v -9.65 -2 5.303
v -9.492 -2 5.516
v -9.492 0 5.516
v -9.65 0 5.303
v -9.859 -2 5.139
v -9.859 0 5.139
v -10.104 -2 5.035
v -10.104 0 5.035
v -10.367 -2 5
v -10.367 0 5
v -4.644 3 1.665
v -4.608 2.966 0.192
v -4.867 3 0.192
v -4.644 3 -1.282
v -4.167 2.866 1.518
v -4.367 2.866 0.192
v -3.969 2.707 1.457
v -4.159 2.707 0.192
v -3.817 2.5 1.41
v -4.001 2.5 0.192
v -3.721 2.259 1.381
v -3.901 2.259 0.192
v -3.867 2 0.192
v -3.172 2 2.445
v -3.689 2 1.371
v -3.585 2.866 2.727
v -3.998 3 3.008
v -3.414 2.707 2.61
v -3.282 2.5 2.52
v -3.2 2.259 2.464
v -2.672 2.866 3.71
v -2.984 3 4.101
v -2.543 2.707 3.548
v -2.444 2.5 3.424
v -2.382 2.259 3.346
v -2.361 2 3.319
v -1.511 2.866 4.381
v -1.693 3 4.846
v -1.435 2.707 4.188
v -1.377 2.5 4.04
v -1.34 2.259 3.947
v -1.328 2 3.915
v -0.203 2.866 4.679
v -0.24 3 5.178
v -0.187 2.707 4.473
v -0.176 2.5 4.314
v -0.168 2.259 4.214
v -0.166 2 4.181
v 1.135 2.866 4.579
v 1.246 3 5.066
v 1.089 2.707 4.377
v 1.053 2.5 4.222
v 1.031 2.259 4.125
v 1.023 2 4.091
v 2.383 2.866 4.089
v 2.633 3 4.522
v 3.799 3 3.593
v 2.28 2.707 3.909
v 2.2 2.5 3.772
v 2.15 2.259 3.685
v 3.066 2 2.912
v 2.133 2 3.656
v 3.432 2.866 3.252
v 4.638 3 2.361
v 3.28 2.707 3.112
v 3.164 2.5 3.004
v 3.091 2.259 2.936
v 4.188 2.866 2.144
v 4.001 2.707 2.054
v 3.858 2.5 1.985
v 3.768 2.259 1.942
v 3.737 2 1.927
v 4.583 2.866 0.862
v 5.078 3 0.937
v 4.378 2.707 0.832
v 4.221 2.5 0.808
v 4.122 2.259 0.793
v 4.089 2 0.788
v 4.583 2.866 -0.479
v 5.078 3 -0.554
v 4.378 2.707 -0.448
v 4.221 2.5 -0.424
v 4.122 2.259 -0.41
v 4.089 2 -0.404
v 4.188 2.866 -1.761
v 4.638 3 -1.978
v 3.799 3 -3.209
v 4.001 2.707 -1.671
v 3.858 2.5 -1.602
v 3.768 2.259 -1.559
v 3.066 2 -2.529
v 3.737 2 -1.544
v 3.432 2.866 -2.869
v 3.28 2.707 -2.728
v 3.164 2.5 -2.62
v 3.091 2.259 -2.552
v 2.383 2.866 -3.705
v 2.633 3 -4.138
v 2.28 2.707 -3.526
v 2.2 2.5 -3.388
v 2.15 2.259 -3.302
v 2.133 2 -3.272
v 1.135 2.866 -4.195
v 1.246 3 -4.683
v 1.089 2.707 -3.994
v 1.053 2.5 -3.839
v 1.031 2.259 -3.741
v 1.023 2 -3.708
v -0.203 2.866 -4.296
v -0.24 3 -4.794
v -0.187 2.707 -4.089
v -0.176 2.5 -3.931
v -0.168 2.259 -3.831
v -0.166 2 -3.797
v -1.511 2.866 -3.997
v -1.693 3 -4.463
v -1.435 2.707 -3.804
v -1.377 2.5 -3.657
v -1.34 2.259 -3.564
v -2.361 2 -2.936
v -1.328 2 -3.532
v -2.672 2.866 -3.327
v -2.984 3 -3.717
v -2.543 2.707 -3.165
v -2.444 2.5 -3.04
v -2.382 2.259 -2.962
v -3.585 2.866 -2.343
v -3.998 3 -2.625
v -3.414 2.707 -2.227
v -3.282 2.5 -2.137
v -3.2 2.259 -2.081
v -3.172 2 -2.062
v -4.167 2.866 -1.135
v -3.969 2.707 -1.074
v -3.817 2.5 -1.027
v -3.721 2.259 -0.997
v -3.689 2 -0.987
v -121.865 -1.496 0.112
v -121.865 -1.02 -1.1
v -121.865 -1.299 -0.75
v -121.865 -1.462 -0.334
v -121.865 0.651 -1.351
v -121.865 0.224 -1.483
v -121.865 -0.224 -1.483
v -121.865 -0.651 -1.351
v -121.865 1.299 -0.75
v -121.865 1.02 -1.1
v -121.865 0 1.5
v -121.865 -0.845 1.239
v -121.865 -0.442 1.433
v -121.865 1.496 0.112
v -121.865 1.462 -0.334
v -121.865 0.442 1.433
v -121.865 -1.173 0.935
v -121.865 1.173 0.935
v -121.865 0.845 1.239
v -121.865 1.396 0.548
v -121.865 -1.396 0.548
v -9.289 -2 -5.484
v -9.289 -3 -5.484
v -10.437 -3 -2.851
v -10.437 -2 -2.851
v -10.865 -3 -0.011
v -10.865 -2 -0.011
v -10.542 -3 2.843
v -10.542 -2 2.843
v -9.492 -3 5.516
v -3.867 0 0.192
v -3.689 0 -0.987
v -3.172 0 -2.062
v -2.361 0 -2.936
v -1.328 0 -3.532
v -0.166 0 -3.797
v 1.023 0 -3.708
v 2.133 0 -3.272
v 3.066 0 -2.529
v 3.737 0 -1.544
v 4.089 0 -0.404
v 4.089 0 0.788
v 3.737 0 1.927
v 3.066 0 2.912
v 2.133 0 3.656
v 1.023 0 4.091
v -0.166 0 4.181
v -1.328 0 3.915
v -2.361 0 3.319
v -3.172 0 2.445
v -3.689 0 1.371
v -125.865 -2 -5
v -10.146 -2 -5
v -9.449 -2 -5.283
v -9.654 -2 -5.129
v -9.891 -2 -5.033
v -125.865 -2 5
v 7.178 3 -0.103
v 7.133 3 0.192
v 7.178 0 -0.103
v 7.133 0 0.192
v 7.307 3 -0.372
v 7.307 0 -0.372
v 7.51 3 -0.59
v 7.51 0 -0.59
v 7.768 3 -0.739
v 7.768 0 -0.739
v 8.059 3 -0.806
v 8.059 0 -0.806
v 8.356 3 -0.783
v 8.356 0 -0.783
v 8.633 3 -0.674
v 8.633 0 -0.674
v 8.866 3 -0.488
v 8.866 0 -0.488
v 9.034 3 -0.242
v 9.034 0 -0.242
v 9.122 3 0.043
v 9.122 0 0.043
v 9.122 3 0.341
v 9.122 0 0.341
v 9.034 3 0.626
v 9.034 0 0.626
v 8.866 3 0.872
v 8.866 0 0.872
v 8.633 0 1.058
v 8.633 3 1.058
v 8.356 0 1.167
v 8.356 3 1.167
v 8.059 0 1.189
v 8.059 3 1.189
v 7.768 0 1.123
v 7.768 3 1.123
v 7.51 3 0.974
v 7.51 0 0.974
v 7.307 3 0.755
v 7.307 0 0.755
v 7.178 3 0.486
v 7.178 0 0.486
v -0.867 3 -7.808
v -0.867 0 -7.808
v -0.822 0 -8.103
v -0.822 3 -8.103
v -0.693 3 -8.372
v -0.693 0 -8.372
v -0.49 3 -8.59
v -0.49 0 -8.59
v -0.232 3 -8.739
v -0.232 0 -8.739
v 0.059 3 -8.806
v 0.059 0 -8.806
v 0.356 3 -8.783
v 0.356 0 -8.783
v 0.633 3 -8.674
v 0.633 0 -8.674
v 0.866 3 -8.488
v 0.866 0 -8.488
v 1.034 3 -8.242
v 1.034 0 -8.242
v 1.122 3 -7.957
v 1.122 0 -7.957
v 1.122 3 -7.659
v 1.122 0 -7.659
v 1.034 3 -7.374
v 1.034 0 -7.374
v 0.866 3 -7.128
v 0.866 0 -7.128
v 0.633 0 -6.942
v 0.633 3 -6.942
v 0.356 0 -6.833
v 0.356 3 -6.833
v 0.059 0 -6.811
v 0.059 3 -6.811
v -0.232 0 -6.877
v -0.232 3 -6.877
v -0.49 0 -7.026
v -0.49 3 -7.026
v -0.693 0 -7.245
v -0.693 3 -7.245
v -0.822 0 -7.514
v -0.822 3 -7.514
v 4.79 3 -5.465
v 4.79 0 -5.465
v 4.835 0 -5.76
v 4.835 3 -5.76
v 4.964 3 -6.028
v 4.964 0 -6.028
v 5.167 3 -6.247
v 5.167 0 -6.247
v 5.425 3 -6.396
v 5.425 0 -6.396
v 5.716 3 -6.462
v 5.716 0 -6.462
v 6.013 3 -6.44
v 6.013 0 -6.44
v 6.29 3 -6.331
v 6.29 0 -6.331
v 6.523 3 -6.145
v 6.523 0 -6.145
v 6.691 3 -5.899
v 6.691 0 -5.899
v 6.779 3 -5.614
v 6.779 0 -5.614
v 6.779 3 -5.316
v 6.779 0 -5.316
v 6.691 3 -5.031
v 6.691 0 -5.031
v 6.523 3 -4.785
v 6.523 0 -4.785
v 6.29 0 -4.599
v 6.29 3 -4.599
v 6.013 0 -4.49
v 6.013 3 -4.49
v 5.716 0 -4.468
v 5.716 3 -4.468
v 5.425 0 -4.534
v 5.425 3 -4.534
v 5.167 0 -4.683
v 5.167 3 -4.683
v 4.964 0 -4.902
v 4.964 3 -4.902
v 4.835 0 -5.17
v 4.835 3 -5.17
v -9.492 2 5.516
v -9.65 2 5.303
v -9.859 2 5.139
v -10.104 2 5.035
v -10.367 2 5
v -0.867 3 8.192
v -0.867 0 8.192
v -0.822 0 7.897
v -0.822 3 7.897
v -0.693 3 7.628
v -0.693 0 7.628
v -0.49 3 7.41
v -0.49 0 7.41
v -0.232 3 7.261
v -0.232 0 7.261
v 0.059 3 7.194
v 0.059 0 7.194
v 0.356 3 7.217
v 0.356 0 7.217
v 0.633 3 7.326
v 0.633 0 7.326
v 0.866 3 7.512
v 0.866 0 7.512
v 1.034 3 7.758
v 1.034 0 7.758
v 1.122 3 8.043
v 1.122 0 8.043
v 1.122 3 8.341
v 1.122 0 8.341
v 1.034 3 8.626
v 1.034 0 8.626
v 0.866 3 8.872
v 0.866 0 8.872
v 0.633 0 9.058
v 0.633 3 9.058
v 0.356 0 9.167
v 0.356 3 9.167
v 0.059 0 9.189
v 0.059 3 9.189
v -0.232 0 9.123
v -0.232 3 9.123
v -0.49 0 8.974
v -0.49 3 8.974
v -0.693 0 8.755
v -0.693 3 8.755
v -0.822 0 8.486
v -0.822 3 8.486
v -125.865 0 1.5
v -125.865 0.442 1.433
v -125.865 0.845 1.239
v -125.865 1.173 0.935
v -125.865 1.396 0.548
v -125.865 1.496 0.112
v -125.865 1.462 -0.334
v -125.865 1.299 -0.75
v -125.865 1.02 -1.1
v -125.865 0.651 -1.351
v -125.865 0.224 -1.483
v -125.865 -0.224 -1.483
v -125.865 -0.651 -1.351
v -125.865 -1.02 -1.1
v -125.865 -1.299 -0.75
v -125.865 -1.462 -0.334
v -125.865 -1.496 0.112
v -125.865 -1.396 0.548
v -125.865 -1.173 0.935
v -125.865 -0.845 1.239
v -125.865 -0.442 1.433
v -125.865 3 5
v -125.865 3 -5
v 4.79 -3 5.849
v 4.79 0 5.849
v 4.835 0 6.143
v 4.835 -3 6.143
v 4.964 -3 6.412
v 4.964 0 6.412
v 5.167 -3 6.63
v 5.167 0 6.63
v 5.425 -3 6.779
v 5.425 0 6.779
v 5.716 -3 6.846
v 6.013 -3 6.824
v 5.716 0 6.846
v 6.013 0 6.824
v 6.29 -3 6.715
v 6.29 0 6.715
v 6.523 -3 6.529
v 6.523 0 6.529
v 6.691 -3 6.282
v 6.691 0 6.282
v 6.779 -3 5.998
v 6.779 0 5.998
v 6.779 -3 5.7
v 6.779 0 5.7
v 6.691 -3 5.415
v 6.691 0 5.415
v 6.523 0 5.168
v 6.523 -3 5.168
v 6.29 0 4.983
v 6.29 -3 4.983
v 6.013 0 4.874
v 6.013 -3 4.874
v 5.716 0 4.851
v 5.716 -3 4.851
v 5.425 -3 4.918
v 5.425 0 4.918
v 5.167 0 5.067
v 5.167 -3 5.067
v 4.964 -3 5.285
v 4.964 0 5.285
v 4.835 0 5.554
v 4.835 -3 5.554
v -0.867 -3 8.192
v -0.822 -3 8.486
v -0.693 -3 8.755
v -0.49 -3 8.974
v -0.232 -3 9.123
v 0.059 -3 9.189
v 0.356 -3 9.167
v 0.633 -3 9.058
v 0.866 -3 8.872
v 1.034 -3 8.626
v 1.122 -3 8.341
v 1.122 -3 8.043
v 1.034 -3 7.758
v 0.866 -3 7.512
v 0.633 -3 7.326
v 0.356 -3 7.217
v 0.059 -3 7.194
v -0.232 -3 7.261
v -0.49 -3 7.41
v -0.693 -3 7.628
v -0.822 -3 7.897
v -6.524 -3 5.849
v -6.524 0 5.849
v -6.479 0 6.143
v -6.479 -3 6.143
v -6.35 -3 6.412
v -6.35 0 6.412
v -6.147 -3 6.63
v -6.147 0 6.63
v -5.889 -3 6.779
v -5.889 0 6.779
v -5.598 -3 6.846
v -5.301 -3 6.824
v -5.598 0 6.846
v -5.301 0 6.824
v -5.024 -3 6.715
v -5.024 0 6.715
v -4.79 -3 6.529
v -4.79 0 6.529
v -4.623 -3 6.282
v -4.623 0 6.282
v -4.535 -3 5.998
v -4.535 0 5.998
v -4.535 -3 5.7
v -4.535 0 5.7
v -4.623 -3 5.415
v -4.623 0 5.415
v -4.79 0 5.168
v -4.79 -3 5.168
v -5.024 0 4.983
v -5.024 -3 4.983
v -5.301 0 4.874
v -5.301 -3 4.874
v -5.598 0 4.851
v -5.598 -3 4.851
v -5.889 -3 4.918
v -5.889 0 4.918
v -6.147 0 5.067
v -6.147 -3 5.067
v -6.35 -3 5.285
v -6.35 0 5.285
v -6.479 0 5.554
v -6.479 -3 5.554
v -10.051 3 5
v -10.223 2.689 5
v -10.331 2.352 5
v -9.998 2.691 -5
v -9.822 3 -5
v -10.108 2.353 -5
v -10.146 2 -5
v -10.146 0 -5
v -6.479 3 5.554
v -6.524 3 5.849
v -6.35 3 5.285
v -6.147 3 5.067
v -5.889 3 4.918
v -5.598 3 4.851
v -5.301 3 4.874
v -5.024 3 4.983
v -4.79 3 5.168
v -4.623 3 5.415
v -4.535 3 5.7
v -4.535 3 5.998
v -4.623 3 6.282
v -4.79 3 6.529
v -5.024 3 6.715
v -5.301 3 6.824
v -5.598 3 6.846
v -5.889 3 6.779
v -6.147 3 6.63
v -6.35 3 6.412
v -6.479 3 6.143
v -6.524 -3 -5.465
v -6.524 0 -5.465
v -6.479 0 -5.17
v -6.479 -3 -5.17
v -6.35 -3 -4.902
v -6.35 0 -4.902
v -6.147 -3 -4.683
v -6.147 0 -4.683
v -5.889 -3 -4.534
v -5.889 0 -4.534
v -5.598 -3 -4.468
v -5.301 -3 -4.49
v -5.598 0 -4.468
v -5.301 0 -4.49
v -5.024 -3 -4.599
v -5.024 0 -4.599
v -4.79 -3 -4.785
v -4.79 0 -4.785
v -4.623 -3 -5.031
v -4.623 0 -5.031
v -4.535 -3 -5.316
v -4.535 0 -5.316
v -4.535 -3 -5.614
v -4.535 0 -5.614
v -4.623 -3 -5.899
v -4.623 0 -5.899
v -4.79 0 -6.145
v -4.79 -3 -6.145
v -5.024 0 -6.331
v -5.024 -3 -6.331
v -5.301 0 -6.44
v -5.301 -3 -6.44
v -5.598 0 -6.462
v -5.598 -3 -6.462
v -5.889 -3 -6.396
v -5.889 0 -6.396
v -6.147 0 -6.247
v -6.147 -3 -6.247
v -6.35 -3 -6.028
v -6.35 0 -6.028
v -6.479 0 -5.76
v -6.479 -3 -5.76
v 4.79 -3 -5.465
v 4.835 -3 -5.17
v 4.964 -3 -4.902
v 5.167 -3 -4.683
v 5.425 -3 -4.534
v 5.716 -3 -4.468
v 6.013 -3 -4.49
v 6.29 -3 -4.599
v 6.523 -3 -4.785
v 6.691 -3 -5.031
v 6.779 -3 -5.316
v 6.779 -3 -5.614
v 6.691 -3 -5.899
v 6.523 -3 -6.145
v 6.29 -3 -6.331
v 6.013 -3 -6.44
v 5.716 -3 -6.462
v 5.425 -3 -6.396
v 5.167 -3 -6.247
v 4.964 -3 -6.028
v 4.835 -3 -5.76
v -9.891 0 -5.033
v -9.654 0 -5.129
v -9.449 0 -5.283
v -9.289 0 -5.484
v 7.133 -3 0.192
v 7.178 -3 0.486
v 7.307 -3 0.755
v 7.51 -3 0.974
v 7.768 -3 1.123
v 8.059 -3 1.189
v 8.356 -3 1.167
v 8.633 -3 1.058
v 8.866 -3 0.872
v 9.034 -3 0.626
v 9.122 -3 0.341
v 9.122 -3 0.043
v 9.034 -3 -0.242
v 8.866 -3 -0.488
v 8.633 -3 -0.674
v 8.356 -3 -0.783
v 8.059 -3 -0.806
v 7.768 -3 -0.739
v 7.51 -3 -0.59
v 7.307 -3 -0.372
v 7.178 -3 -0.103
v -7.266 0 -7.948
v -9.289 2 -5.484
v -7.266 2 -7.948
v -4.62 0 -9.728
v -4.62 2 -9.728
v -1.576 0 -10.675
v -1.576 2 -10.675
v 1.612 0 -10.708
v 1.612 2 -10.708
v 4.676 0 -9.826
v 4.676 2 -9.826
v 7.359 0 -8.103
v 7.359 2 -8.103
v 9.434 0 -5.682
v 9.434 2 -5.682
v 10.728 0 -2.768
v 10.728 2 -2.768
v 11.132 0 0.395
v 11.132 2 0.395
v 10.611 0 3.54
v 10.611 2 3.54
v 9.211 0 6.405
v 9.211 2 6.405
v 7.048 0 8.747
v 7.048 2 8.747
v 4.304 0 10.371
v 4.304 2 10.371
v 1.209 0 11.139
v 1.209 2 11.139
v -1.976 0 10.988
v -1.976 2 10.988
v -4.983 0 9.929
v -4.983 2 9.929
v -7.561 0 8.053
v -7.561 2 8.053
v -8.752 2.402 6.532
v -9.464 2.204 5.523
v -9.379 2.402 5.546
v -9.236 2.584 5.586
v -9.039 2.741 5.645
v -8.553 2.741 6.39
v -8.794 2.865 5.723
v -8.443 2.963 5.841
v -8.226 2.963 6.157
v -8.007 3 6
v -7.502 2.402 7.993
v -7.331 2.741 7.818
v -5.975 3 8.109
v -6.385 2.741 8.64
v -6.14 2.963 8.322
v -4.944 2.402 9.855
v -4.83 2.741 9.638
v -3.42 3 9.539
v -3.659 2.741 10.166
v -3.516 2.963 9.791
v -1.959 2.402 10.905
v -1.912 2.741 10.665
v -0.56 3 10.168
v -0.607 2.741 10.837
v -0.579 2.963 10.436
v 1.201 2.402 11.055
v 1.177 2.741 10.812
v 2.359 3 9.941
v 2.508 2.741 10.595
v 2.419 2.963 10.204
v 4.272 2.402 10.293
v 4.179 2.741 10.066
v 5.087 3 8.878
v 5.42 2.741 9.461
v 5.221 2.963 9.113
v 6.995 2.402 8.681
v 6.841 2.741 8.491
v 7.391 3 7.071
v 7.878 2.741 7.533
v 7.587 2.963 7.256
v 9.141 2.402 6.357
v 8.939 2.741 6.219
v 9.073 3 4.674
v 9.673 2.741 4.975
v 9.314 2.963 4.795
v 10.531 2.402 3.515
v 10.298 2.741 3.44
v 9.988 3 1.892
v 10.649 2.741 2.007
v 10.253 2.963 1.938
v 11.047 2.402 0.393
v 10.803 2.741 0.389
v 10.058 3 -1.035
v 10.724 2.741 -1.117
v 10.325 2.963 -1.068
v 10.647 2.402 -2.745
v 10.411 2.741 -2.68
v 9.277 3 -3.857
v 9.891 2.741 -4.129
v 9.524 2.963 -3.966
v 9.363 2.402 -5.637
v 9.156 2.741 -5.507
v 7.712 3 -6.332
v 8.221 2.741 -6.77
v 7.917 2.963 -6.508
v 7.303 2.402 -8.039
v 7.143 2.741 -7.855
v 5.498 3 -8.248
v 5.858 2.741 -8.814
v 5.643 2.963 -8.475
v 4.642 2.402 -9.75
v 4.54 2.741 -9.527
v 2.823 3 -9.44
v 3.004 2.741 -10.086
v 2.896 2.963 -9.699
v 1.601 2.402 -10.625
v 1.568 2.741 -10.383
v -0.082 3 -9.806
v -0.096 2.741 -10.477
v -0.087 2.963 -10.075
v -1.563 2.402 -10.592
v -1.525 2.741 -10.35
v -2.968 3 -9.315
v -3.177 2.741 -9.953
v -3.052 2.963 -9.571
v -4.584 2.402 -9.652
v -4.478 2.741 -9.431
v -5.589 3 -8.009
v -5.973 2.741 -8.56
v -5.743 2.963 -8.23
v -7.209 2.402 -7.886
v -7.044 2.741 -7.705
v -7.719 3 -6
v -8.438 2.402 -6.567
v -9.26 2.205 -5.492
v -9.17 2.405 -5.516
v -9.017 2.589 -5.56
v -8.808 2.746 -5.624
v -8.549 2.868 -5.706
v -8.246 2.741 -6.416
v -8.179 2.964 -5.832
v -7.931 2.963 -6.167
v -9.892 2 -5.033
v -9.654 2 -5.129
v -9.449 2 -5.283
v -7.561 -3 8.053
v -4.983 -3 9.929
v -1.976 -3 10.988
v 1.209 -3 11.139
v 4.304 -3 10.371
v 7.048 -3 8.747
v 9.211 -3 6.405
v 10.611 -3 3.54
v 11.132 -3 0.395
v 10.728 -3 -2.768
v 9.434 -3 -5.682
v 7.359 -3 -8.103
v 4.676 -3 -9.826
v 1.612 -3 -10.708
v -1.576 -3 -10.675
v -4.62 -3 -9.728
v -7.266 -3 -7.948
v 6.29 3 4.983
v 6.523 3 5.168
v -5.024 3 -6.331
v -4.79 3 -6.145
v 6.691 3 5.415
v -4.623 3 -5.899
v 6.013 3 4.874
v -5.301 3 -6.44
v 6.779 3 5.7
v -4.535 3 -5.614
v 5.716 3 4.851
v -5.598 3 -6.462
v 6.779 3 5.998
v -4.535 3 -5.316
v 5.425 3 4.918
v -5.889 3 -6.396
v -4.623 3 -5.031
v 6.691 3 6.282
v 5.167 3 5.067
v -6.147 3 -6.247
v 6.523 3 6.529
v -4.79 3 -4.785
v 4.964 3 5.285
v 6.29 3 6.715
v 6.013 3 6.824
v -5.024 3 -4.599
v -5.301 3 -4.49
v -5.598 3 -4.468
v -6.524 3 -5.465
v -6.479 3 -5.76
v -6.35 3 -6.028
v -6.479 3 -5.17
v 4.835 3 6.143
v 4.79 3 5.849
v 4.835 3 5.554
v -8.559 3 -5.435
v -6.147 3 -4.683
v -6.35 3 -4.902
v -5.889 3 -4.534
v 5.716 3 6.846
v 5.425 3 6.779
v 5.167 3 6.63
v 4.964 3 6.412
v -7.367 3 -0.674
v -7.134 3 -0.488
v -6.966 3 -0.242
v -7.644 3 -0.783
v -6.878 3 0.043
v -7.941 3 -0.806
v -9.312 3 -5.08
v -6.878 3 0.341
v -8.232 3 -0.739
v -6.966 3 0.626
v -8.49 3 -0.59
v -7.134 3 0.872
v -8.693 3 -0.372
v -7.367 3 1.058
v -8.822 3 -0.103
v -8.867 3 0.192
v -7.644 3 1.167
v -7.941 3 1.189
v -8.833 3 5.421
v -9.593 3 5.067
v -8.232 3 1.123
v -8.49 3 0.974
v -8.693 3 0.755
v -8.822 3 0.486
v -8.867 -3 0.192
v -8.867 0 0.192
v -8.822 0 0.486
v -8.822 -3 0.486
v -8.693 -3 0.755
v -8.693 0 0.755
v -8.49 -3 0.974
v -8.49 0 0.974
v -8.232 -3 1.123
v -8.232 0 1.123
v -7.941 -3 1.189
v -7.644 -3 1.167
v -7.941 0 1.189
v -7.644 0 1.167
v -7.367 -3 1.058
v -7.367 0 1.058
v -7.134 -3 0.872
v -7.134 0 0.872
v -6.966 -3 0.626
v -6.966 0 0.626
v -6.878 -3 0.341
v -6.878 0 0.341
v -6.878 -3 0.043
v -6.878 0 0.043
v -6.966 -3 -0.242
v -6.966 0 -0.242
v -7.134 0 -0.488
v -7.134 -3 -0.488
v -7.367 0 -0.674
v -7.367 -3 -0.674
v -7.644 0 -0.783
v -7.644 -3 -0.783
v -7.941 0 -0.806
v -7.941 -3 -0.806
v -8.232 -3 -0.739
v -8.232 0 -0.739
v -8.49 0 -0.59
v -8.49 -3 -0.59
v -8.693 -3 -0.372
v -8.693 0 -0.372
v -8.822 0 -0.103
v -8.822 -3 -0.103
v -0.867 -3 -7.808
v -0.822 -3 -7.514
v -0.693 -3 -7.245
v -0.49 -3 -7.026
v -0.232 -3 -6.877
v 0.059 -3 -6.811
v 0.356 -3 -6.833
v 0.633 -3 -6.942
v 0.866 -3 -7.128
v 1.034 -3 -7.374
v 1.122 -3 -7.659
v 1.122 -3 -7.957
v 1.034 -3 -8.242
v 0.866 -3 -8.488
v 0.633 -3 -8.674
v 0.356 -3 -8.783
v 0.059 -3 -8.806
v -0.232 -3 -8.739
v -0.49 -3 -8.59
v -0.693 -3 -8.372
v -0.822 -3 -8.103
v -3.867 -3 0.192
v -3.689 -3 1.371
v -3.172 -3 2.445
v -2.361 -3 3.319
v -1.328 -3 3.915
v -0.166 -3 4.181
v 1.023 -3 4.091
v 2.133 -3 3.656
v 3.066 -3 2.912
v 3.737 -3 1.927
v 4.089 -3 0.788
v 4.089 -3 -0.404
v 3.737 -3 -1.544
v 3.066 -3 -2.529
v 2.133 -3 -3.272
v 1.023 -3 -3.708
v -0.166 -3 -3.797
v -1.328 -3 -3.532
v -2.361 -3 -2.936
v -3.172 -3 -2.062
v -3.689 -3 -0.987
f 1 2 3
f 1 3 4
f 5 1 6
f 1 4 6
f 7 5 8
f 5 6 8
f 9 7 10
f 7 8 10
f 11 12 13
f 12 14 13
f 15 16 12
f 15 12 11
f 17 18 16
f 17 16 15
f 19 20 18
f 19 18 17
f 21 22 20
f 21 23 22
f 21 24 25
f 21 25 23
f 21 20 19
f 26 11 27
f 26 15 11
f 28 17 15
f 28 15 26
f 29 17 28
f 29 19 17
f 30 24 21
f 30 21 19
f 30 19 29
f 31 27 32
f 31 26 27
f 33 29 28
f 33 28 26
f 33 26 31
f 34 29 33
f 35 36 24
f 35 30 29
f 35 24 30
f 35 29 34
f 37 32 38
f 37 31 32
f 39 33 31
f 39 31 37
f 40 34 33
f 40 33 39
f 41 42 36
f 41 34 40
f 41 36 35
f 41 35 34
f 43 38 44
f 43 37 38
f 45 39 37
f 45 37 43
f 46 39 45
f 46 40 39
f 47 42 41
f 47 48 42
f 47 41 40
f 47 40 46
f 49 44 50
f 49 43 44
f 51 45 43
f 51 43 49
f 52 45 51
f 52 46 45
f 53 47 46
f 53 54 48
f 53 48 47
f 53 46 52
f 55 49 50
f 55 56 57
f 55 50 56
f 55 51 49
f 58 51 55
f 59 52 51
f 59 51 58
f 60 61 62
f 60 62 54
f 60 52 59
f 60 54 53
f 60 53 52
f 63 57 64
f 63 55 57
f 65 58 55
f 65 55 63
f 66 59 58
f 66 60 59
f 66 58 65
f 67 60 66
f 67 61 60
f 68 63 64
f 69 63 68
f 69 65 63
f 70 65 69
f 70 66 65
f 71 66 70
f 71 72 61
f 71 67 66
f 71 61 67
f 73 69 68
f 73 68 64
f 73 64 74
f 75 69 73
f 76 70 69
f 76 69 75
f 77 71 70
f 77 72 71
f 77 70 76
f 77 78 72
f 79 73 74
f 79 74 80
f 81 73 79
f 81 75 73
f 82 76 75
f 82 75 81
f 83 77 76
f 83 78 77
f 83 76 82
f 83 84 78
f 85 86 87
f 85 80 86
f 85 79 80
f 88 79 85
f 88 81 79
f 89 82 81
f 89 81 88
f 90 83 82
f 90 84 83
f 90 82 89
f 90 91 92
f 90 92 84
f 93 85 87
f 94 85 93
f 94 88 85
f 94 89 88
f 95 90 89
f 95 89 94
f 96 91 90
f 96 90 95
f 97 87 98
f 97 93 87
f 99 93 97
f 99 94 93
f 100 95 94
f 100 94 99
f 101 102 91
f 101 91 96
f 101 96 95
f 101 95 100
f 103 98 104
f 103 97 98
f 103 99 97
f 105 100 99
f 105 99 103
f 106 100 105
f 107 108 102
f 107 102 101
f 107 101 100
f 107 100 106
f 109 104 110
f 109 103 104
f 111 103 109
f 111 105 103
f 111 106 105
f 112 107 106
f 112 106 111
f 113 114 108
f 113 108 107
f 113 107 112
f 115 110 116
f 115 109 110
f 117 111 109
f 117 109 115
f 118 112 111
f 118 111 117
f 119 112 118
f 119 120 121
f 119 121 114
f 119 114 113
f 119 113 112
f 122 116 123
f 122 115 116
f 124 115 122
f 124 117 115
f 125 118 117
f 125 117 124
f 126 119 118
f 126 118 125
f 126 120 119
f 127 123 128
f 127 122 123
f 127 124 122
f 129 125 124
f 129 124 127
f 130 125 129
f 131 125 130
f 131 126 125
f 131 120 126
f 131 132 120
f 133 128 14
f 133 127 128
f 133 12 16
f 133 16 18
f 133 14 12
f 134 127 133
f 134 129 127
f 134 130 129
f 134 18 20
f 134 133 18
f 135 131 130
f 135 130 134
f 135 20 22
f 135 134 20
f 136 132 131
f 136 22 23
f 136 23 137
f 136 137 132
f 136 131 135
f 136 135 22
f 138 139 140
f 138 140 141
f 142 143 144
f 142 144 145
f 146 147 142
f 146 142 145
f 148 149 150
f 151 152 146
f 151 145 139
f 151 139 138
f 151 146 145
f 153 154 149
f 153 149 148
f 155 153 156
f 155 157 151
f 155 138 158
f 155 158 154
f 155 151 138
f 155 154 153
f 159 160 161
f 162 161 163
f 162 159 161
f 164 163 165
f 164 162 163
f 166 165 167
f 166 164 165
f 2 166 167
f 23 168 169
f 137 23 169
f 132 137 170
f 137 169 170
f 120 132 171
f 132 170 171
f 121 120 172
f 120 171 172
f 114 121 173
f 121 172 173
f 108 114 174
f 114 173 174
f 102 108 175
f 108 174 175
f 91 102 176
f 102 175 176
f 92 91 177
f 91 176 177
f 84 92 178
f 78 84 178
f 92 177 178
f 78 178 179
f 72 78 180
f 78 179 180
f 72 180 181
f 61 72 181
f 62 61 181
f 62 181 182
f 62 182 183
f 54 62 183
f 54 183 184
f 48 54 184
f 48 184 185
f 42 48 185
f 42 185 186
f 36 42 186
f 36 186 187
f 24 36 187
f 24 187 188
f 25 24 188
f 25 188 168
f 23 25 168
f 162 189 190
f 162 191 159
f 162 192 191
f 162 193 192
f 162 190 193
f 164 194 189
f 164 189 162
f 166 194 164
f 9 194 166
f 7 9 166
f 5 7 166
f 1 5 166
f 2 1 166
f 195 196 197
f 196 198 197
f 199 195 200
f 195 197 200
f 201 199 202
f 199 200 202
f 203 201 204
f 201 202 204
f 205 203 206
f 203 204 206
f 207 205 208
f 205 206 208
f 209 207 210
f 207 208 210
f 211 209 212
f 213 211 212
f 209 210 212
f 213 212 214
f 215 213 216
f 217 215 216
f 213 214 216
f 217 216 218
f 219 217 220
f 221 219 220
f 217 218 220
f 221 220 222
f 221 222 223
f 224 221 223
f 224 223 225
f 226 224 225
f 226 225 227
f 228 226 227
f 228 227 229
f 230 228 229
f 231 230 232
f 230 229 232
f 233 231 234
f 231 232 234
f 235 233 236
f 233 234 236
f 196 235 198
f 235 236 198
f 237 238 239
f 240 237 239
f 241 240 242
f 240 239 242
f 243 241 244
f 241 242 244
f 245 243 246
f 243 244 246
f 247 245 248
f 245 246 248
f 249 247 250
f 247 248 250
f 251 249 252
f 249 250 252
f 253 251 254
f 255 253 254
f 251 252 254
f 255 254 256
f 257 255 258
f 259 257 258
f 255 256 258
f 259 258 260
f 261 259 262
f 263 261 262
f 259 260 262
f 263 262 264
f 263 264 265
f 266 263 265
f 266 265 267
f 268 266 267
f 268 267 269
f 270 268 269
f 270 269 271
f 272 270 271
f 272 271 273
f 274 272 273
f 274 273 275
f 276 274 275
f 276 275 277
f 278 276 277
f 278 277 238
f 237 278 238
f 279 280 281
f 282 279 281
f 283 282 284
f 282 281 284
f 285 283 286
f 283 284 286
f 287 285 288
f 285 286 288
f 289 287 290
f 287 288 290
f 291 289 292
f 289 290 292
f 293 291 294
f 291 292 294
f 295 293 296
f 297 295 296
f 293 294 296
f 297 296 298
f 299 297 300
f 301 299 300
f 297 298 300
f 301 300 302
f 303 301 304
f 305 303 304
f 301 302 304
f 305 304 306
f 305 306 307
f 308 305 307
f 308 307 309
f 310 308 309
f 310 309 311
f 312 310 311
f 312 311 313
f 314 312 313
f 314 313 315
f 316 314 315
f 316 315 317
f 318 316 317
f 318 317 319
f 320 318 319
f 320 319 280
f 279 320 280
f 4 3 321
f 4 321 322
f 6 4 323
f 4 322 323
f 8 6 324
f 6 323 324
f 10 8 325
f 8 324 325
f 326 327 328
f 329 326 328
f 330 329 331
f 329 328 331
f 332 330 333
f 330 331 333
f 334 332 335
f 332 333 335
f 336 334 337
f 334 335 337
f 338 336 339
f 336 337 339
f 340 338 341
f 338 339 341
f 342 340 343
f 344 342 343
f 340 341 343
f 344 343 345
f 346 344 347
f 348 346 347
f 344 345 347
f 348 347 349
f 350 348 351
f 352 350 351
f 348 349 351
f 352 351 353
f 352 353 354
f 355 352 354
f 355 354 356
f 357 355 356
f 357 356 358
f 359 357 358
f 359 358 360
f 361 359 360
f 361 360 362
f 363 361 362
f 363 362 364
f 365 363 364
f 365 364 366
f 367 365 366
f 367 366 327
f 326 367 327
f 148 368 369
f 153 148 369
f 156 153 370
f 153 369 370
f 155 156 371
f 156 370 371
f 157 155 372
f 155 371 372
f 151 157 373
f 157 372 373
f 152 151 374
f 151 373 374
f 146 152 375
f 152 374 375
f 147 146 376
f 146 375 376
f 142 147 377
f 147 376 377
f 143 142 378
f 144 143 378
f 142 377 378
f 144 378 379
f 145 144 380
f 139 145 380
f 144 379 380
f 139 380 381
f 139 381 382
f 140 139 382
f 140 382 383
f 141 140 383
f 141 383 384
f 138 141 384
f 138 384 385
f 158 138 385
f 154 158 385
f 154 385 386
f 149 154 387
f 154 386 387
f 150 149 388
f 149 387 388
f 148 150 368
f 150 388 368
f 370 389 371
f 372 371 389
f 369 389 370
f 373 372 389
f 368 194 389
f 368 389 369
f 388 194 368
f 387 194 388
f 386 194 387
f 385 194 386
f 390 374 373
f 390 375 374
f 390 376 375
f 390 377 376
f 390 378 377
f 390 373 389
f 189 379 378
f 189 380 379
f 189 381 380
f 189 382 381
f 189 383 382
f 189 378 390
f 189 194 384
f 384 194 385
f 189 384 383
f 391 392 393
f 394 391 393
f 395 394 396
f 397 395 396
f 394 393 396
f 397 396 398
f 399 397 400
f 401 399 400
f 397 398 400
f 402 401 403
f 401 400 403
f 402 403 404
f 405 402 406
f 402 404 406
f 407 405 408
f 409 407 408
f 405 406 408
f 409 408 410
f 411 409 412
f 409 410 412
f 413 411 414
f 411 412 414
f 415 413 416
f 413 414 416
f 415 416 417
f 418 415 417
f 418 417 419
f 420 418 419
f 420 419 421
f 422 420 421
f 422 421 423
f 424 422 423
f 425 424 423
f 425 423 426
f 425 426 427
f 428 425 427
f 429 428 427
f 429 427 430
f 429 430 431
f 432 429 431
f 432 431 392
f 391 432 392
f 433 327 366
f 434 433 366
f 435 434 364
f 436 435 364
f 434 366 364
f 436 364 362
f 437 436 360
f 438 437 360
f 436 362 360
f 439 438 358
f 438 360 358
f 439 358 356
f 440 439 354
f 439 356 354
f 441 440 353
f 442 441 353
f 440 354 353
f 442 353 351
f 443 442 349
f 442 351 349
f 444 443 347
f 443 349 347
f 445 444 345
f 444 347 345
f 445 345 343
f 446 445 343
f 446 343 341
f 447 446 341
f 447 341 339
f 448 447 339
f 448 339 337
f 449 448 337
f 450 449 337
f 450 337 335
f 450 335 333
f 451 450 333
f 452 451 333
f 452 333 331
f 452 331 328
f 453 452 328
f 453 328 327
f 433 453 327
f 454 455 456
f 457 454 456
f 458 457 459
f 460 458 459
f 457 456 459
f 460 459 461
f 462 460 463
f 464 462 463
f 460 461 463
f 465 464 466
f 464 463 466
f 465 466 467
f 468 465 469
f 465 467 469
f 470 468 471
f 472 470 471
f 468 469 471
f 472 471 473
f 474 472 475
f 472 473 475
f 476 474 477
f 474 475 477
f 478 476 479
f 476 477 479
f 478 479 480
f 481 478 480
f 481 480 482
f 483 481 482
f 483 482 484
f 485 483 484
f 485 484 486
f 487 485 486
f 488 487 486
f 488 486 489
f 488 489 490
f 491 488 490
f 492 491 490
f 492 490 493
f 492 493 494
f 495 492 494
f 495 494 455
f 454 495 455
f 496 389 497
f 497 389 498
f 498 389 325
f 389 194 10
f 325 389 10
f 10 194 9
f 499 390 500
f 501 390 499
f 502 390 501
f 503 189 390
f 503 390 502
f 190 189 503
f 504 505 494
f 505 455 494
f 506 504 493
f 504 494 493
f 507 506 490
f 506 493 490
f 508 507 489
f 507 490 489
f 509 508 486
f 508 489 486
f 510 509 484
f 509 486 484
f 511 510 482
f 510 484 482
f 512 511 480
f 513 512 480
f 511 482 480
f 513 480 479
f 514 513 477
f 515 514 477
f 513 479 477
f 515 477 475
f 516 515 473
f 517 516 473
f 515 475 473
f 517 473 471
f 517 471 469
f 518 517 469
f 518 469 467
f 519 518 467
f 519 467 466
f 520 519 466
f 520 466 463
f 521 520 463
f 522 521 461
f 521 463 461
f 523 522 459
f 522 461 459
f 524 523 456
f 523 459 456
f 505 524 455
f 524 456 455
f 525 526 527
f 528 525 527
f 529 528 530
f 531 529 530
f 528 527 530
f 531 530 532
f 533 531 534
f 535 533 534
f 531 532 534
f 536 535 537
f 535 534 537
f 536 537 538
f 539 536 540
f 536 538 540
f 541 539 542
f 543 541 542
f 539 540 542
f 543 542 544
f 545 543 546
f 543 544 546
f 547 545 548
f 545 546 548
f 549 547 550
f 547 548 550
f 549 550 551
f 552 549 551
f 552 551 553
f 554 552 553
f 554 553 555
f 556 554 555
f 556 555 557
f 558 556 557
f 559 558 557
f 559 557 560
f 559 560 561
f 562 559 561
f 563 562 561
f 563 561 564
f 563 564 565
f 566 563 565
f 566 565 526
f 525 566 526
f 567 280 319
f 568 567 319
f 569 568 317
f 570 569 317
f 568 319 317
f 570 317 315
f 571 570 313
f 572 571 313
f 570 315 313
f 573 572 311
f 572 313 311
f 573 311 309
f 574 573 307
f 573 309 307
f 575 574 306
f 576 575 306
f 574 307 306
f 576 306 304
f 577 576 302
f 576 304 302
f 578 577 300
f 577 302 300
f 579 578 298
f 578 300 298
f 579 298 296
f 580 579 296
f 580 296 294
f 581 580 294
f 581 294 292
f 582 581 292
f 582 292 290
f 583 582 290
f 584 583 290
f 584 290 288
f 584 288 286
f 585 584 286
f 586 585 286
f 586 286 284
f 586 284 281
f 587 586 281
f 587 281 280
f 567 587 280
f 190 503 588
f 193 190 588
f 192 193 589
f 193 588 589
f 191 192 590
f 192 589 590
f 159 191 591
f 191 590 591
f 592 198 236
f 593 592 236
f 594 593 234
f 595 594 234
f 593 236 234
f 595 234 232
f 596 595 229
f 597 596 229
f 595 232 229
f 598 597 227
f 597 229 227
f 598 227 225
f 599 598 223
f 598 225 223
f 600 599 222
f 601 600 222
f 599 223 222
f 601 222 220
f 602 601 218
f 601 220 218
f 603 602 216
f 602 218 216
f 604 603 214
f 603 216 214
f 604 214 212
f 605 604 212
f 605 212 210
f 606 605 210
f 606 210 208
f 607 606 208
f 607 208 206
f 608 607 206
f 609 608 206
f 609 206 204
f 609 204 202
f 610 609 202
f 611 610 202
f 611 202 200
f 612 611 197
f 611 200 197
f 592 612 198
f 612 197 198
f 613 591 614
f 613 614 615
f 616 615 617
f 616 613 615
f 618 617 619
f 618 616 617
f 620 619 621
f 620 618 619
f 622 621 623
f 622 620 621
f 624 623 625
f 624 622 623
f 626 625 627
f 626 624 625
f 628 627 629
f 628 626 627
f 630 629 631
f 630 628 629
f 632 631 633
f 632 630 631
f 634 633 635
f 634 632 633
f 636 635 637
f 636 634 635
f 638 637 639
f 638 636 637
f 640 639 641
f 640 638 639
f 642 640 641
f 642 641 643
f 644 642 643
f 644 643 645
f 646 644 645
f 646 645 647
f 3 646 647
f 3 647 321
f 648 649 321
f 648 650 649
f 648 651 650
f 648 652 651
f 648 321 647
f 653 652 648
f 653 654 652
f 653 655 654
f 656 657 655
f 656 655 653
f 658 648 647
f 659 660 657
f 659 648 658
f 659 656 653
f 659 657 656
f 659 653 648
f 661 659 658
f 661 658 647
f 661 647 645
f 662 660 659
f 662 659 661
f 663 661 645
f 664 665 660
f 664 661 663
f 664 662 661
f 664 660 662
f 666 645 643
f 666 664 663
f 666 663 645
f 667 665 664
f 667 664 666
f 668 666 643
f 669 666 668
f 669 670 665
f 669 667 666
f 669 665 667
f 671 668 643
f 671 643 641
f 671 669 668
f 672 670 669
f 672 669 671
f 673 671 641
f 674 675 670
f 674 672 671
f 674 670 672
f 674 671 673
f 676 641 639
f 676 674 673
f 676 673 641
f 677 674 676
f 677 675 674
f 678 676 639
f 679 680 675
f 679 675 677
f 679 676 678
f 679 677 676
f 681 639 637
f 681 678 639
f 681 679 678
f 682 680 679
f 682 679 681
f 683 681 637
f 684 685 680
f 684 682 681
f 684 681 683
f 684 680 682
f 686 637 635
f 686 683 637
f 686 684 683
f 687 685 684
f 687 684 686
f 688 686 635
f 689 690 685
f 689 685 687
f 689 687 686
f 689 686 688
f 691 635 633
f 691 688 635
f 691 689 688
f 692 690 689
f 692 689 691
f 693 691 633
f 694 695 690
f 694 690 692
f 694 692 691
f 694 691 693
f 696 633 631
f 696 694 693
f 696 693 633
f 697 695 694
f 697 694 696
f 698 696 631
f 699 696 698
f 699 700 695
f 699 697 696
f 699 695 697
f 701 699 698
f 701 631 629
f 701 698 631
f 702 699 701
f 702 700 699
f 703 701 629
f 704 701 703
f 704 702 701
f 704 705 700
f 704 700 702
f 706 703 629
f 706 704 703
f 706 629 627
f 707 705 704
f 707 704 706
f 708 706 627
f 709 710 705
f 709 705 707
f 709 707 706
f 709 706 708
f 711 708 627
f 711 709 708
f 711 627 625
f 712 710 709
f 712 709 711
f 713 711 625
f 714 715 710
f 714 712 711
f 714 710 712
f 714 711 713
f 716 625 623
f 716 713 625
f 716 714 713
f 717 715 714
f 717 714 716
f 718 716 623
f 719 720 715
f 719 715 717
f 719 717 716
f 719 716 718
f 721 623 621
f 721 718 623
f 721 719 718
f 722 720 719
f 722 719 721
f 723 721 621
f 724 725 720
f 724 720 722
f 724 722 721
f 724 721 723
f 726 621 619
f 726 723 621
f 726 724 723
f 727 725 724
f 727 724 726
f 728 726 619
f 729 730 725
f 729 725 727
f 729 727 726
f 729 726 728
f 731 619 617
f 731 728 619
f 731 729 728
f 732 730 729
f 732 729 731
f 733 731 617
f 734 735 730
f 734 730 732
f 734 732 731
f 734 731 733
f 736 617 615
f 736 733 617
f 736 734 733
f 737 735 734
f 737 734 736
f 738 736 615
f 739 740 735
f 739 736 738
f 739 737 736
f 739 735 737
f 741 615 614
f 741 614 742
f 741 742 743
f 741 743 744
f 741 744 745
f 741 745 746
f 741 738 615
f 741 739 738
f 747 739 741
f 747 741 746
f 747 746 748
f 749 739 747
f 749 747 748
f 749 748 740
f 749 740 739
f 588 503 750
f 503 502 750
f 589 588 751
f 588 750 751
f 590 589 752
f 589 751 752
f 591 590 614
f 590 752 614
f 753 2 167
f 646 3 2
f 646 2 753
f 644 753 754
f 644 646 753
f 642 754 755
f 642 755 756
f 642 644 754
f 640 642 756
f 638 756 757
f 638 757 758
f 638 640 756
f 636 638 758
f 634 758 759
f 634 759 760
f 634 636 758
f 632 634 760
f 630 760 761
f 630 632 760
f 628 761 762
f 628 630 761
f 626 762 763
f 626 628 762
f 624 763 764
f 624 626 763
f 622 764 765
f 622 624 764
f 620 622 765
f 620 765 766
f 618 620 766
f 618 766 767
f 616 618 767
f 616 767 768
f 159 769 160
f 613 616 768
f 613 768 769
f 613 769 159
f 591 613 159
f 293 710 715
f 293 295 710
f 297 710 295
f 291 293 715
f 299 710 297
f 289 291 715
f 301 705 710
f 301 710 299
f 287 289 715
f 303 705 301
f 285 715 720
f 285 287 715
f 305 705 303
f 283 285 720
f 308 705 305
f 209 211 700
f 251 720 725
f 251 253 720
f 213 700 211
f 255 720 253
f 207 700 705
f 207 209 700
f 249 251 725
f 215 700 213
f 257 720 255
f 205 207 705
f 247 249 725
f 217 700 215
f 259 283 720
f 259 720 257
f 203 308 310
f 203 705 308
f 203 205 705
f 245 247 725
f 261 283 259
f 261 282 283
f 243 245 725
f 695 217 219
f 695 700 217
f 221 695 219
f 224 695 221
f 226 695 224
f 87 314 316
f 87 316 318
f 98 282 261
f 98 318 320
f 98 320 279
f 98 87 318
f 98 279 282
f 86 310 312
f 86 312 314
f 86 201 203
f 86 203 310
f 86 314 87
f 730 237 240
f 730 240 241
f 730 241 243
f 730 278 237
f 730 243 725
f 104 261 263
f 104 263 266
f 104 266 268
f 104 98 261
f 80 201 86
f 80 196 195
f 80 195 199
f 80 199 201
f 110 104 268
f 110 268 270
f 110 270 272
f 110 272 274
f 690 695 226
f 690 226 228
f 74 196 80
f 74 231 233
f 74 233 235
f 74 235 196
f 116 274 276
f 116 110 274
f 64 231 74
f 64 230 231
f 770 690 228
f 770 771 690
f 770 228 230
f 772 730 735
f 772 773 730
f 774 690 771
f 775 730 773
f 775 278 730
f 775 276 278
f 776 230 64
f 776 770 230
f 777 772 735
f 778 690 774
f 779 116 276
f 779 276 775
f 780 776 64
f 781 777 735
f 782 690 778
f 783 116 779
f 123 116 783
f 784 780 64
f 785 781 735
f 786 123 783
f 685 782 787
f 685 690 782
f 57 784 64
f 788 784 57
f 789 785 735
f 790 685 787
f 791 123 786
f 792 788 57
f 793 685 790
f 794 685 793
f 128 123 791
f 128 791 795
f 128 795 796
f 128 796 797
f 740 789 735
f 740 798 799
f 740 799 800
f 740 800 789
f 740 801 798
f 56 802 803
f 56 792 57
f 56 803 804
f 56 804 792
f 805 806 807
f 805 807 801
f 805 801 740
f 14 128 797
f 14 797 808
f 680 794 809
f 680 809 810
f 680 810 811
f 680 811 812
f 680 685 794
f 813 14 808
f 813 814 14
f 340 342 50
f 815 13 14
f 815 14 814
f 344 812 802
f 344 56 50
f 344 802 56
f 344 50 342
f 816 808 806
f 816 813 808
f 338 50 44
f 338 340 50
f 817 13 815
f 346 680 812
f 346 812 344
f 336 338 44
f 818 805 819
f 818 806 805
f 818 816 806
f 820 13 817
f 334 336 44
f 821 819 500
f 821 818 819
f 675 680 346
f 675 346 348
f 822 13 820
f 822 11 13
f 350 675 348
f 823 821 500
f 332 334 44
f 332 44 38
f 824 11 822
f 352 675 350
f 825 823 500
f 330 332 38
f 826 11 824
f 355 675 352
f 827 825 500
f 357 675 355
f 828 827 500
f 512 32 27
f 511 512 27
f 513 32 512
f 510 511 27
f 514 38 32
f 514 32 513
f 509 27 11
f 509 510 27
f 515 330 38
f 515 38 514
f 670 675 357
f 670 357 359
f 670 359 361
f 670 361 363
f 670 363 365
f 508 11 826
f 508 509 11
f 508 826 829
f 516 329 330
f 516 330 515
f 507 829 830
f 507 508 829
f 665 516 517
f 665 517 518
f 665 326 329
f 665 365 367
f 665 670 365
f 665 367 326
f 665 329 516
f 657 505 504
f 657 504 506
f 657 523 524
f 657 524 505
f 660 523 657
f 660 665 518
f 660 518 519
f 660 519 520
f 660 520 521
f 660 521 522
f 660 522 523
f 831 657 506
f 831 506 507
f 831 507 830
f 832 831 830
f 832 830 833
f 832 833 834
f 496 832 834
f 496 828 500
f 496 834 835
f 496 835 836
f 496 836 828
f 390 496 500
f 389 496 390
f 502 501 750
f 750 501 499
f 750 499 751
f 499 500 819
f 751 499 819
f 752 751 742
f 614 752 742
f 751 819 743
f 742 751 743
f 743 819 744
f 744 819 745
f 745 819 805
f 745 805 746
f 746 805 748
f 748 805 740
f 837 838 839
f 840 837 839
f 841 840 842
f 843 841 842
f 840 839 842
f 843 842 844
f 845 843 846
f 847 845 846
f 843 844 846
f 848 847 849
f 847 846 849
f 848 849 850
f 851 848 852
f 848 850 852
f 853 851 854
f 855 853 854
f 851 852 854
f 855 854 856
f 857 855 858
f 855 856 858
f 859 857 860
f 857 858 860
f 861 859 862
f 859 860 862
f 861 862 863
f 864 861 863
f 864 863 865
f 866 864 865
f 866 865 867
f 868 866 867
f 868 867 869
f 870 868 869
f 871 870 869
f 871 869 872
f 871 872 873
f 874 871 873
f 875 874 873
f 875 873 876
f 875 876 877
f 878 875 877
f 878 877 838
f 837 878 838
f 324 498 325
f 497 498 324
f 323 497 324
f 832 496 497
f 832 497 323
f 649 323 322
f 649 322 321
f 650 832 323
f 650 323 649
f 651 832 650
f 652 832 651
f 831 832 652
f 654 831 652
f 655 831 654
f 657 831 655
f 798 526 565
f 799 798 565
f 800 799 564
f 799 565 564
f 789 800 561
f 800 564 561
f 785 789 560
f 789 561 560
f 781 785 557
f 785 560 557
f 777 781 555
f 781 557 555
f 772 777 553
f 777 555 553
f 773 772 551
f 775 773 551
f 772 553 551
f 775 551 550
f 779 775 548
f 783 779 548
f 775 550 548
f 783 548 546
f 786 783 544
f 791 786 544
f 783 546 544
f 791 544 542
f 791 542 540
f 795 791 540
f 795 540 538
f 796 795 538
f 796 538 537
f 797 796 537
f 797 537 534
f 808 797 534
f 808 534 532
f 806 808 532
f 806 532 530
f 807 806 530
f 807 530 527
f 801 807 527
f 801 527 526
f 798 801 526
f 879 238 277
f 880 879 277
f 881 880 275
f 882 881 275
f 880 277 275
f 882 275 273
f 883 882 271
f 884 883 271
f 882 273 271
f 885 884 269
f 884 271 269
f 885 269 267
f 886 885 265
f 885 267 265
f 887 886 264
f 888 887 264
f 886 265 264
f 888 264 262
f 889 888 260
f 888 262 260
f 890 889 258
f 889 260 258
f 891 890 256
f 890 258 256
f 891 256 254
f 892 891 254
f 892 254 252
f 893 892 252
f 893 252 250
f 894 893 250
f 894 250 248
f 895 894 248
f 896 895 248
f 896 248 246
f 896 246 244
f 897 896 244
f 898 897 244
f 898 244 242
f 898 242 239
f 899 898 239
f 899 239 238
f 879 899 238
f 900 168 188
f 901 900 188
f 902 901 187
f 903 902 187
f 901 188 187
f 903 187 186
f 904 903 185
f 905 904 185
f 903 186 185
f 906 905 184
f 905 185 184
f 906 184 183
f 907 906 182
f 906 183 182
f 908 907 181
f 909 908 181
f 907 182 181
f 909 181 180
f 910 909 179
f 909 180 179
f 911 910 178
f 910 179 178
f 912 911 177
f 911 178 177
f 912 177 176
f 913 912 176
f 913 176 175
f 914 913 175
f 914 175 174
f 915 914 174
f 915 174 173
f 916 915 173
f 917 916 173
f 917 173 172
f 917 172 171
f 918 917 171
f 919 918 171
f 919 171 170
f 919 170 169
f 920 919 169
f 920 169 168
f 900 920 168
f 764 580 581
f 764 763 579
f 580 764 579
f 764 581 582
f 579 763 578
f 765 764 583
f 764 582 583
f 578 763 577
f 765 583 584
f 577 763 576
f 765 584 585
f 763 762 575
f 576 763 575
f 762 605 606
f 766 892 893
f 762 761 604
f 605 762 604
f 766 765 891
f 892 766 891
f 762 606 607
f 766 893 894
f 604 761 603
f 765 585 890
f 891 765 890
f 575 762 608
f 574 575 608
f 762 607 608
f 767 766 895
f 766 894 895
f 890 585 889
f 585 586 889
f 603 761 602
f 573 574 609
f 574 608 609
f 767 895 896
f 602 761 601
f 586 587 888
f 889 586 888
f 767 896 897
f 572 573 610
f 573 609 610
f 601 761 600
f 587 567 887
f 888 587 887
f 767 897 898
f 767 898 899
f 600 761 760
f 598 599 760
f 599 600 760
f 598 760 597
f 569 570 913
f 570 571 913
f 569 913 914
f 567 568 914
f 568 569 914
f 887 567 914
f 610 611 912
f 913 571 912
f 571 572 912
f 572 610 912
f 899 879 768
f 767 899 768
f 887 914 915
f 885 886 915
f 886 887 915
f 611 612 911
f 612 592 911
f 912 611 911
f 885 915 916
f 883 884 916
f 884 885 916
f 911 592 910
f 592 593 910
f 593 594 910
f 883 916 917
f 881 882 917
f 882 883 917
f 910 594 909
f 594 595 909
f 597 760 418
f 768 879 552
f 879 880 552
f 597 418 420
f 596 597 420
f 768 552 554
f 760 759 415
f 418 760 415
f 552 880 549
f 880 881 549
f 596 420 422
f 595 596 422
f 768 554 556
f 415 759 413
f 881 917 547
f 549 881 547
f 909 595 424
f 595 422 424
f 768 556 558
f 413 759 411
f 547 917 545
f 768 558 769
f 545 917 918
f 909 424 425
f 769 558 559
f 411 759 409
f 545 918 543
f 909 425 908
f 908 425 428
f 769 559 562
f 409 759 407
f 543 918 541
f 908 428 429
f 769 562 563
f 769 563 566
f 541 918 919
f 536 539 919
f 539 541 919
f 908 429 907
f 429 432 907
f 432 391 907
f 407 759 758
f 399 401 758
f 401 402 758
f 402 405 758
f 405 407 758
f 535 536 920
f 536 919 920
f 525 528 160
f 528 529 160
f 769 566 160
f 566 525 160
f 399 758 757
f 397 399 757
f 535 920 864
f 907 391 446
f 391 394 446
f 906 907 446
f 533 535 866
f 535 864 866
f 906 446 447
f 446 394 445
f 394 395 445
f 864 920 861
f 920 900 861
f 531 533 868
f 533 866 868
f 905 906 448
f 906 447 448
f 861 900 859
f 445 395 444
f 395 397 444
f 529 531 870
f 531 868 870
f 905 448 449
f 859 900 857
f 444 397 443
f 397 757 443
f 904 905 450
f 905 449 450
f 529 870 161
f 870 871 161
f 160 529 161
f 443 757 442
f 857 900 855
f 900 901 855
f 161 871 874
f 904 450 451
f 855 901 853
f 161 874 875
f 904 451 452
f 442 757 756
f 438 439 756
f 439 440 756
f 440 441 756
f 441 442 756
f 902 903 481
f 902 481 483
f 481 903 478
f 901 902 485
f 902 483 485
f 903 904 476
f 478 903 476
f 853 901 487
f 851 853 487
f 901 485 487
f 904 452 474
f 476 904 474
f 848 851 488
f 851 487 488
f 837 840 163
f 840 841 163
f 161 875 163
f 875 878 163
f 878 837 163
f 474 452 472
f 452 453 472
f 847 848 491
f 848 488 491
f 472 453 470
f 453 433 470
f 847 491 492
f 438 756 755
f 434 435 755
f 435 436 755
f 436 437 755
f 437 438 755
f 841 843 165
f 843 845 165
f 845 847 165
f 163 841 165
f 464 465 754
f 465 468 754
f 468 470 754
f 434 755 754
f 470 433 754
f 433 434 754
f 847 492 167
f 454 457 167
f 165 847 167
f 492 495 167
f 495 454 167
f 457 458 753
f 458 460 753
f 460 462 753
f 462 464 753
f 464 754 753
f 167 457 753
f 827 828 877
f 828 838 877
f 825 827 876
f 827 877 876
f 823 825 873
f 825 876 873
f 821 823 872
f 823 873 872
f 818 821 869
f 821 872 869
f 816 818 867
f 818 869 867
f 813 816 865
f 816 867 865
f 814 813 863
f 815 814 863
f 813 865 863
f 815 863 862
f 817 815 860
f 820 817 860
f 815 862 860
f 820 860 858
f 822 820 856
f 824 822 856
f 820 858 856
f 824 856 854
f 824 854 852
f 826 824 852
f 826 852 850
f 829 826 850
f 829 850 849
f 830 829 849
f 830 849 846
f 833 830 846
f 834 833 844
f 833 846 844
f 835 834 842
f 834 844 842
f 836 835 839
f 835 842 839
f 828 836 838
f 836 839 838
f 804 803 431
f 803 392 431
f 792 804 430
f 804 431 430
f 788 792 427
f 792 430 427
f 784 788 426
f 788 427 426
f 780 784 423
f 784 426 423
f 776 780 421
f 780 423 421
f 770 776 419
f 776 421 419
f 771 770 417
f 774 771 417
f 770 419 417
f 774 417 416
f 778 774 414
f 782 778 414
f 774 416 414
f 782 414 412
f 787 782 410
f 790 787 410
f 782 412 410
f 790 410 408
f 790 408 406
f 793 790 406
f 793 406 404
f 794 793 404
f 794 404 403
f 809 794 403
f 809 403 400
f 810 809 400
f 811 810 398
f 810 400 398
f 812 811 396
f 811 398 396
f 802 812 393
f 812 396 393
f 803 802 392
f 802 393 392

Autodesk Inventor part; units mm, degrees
ref_plane "YZ Plane" through (0, 0, 0) normal (1, 0, 0) x (0, 1, 0)
ref_plane "XZ Plane" through (0, 0, 0) normal (0, 1, 0) x (-1, 0, 0)
ref_plane "XY Plane" through (0, 0, 0) normal (0, 0, 1) x (1, 0, 0)
sketch "스케치1" plane through (0, 0, 0) normal (0, 1, 0) x (-1, 0, 0)
  circle A0 centre (-0.1334, 0.1917) radius 4
  circle A1 centre (-0.1334, 0.1917) radius 11
  circle A2 centre (-0.1334, 0.1917) radius 11
  circle A3 centre (-0.1334, 0.1917) radius 8
  circle A4 centre (-0.1334, 8.1917) radius 1
  circle A5 centre (-5.7903, 5.8486) radius 1
  circle A6 centre (-8.1334, 0.1917) radius 1
  circle A7 centre (-5.7903, -5.4651) radius 1
  circle A8 centre (-0.1334, -7.8083) radius 1
  circle A9 centre (5.5235, -5.4651) radius 1
  circle A10 centre (7.8666, 0.1917) radius 1
  circle A11 centre (5.5235, 5.8486) radius 1
  line L0 (0, 0) -> (0, -10.8075)
  line L1 (10.8649, 0) -> (125.8649, 0)
  line L2 (125.8649, 0) -> (125.8649, -5)
  line L3 (125.8649, -5) -> (9.5643, -5)
  line L4 (125.8649, 0) -> (125.8649, 5)
  line L5 (125.8649, 5) -> (9.7601, 5)
  point P0 (9.5643, -5)
  point P1 (9.7601, 5)
  dimension "d2" = 16
  dimension "d3" = 2
  dimension "d4" = 360
  dimension "d5" = 115
  dimension "d6" = 5
  dimension "d7" = 5
extrude "돌출1" add sketch "스케치1" along normal blind 3 contours A1 | A1 L5 L4 L1 | L1 L2 L3 A1 | A10 A3 A9 A8 A7 A6 A5 A4 A11
fillet "모깎기1" radius 1 4 edges at (-9.7601, 1.5, 5) (-9.5643, 1.5, -5) (4.1334, 3, 0.1917) (11.1313, 3, 0.407)
sketch "스케치3" plane through (0, 0, 0) normal (0, -1, 0) x (1, 0, 0)
  arc A0 (-10.3673, 5) -> (-9.4922, 5.516) centre (-10.3673, 6) ccw projected
  arc A1 (-9.2892, -5.484) -> (-9.4922, 5.516) centre (0.1334, 0.1917) ccw projected
  arc A2 (-9.4922, 5.516) -> (-9.2892, -5.484) centre (0.1334, 0.1917) ccw
  arc A3 (-10.3673, 5) -> (-9.4922, 5.516) centre (-10.3673, 6) ccw
  arc A4 (-9.2892, -5.484) -> (-10.1458, -5) centre (-10.1458, -6) ccw projected
  arc A5 (-9.2892, -5.484) -> (-10.1458, -5) centre (-10.1458, -6) ccw
  line L0 (-125.8649, -5) -> (-125.8649, 5) projected
  line L1 (-10.1458, -5) -> (-125.8649, -5)
  line L2 (-125.8649, -5) -> (-125.8649, 5)
  line L3 (-125.8649, 5) -> (-10.3673, 5)
  point P0 (0, 0)
extrude "돌출3" add sketch "스케치3" along normal blind 2 contours A0 A2 A4 L1 L0 L3
thicken "두껍게 하기1" operation add thickness 3 both sides no extend neighbours no toward (0, -1, 0) faces at (3.6327, 0, 8.2973)
sketch "스케치4" plane through (-125.8649, 3, -5) normal (-1, 0, 0) x (0, 0, 1)
  circle A0 centre (5, -3) radius 1.5
  dimension "d20" = 3
extrude "돌출4" cut sketch "스케치4" against normal blind 4
properties part number "팔" material "ABS 플라스틱"
